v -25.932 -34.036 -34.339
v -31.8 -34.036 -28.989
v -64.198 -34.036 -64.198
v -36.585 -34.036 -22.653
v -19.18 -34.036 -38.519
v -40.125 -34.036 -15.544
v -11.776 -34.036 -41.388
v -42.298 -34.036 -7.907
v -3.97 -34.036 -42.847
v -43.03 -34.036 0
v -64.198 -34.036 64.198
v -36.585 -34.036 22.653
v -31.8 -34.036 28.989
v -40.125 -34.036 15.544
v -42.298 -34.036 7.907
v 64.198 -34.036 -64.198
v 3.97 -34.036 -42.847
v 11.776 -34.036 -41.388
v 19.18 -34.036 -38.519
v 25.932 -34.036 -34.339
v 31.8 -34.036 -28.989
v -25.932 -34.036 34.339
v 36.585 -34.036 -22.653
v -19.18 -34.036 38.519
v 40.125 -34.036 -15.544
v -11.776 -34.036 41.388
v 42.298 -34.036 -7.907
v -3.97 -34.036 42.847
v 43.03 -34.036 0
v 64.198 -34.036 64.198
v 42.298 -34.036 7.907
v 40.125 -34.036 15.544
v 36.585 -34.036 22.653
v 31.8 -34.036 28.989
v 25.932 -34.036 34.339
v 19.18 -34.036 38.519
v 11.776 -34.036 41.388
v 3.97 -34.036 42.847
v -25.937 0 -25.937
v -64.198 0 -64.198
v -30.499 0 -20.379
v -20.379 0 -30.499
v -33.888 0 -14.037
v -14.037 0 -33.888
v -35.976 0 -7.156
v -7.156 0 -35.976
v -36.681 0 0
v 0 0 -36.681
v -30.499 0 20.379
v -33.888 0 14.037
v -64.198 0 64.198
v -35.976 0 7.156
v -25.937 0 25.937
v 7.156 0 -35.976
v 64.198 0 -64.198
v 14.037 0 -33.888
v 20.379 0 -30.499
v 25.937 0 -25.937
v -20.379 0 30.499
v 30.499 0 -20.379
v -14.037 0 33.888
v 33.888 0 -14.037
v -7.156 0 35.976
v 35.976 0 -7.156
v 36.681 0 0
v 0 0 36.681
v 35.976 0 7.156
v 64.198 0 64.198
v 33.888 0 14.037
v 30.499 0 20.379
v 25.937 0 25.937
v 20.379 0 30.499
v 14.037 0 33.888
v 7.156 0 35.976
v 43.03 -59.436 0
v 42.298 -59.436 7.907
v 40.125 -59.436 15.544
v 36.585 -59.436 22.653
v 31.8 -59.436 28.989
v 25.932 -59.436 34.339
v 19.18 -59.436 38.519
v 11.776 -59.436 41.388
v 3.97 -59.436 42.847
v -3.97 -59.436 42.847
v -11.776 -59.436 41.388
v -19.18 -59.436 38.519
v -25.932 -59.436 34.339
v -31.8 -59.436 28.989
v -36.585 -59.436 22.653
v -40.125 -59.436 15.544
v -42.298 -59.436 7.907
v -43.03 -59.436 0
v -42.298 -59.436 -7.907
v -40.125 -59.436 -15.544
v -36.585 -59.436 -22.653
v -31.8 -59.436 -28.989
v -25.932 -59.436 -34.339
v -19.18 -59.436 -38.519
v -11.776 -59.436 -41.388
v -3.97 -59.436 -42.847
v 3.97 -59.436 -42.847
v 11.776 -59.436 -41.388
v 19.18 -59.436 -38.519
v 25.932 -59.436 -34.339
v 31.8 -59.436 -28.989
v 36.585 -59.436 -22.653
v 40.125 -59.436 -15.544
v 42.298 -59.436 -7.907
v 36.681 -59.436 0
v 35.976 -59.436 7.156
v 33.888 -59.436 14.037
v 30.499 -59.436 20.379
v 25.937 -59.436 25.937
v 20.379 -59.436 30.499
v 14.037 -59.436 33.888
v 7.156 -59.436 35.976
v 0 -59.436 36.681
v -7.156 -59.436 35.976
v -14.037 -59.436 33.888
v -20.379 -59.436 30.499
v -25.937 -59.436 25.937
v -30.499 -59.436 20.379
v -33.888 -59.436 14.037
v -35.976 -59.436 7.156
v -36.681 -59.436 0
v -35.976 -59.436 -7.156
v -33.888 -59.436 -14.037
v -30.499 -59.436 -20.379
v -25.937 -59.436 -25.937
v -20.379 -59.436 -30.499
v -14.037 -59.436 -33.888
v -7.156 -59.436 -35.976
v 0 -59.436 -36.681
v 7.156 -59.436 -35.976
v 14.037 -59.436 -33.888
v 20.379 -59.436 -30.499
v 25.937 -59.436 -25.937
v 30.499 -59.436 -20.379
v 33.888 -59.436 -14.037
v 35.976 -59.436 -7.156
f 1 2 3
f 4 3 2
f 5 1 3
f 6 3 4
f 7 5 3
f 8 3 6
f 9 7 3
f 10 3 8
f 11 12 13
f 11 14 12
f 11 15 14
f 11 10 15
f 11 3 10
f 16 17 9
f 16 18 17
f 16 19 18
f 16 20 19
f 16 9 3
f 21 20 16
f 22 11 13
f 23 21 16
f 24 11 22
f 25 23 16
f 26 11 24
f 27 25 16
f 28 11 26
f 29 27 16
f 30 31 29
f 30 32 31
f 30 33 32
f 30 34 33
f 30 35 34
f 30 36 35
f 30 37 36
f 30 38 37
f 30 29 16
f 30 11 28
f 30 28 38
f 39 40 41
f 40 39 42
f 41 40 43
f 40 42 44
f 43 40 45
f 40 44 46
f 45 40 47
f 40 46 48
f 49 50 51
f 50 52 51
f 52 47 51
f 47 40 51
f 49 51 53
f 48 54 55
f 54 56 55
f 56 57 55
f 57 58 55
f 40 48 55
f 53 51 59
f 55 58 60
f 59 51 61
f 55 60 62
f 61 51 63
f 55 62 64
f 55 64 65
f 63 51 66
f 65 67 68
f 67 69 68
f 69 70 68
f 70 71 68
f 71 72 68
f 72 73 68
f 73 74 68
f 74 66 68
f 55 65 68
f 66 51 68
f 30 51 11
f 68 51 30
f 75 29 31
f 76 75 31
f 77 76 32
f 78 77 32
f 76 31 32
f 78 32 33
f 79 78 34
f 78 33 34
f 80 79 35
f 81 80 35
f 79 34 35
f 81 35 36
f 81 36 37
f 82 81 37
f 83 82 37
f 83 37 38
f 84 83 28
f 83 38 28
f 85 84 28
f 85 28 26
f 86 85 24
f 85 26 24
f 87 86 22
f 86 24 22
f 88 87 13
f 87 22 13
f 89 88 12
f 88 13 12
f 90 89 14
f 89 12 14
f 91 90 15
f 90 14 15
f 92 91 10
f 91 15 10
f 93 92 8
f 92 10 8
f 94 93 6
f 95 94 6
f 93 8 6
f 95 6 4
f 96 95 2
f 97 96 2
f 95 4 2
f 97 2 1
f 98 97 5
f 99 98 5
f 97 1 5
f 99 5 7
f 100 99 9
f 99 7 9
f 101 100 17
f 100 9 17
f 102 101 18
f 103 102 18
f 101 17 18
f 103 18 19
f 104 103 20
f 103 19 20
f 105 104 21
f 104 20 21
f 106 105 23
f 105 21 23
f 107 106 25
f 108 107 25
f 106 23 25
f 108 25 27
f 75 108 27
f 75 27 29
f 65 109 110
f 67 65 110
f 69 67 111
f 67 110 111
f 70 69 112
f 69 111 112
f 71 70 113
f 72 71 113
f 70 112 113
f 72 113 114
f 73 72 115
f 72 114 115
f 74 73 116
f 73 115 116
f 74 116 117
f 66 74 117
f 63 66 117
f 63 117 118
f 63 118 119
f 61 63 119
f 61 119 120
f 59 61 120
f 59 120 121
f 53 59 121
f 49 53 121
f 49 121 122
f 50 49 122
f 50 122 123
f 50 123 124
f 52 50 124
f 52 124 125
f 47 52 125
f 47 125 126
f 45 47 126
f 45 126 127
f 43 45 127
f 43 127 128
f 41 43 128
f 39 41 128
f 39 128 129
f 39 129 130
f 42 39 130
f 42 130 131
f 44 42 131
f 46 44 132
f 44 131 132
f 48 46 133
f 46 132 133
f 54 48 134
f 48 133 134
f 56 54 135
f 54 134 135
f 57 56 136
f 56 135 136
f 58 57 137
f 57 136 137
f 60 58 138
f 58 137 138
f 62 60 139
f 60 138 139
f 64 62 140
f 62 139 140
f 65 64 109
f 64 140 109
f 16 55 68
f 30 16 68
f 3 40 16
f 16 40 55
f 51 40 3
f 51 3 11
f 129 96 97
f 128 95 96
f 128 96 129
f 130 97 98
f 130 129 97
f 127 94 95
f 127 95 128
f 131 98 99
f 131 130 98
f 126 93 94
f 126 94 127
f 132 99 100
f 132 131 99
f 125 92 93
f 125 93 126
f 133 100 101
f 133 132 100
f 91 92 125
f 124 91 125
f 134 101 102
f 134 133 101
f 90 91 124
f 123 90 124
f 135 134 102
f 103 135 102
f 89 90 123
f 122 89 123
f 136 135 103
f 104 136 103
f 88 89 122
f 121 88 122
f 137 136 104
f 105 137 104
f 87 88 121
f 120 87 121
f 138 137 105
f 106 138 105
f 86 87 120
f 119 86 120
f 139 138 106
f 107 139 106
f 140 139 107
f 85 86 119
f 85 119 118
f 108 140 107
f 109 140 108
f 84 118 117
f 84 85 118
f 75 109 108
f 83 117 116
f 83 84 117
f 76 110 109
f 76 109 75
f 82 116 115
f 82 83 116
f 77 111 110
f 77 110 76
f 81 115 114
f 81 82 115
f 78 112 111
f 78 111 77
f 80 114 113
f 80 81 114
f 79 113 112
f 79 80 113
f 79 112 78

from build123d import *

# Parameters (mm, degrees)
F0_W     = 128.39678
F0_H     = 128.39675
F1_DEPTH = 34.036
F2_R     = 43.0305
F3_DEPTH = 25.4
F4_R     = 36.680501
F5_DEPTH = 94.742


with BuildPart() as f1:
    # F0 (on Front) → F1 (new body)
    with BuildSketch(Plane.XZ):
        Rectangle(F0_W, F0_H)
    extrude(amount=F1_DEPTH)

    # F2 (on face) → F3 (join)
    with BuildSketch(Plane.XZ.offset(34.036)):
        Circle(F2_R)
    extrude(amount=F3_DEPTH)

    # F4 (on face) → F5 (cut)
    with BuildSketch(Plane.XZ.offset(59.436)):
        Circle(F4_R)
    extrude(amount=-F5_DEPTH, mode=Mode.SUBTRACT)


solid = f1.part
